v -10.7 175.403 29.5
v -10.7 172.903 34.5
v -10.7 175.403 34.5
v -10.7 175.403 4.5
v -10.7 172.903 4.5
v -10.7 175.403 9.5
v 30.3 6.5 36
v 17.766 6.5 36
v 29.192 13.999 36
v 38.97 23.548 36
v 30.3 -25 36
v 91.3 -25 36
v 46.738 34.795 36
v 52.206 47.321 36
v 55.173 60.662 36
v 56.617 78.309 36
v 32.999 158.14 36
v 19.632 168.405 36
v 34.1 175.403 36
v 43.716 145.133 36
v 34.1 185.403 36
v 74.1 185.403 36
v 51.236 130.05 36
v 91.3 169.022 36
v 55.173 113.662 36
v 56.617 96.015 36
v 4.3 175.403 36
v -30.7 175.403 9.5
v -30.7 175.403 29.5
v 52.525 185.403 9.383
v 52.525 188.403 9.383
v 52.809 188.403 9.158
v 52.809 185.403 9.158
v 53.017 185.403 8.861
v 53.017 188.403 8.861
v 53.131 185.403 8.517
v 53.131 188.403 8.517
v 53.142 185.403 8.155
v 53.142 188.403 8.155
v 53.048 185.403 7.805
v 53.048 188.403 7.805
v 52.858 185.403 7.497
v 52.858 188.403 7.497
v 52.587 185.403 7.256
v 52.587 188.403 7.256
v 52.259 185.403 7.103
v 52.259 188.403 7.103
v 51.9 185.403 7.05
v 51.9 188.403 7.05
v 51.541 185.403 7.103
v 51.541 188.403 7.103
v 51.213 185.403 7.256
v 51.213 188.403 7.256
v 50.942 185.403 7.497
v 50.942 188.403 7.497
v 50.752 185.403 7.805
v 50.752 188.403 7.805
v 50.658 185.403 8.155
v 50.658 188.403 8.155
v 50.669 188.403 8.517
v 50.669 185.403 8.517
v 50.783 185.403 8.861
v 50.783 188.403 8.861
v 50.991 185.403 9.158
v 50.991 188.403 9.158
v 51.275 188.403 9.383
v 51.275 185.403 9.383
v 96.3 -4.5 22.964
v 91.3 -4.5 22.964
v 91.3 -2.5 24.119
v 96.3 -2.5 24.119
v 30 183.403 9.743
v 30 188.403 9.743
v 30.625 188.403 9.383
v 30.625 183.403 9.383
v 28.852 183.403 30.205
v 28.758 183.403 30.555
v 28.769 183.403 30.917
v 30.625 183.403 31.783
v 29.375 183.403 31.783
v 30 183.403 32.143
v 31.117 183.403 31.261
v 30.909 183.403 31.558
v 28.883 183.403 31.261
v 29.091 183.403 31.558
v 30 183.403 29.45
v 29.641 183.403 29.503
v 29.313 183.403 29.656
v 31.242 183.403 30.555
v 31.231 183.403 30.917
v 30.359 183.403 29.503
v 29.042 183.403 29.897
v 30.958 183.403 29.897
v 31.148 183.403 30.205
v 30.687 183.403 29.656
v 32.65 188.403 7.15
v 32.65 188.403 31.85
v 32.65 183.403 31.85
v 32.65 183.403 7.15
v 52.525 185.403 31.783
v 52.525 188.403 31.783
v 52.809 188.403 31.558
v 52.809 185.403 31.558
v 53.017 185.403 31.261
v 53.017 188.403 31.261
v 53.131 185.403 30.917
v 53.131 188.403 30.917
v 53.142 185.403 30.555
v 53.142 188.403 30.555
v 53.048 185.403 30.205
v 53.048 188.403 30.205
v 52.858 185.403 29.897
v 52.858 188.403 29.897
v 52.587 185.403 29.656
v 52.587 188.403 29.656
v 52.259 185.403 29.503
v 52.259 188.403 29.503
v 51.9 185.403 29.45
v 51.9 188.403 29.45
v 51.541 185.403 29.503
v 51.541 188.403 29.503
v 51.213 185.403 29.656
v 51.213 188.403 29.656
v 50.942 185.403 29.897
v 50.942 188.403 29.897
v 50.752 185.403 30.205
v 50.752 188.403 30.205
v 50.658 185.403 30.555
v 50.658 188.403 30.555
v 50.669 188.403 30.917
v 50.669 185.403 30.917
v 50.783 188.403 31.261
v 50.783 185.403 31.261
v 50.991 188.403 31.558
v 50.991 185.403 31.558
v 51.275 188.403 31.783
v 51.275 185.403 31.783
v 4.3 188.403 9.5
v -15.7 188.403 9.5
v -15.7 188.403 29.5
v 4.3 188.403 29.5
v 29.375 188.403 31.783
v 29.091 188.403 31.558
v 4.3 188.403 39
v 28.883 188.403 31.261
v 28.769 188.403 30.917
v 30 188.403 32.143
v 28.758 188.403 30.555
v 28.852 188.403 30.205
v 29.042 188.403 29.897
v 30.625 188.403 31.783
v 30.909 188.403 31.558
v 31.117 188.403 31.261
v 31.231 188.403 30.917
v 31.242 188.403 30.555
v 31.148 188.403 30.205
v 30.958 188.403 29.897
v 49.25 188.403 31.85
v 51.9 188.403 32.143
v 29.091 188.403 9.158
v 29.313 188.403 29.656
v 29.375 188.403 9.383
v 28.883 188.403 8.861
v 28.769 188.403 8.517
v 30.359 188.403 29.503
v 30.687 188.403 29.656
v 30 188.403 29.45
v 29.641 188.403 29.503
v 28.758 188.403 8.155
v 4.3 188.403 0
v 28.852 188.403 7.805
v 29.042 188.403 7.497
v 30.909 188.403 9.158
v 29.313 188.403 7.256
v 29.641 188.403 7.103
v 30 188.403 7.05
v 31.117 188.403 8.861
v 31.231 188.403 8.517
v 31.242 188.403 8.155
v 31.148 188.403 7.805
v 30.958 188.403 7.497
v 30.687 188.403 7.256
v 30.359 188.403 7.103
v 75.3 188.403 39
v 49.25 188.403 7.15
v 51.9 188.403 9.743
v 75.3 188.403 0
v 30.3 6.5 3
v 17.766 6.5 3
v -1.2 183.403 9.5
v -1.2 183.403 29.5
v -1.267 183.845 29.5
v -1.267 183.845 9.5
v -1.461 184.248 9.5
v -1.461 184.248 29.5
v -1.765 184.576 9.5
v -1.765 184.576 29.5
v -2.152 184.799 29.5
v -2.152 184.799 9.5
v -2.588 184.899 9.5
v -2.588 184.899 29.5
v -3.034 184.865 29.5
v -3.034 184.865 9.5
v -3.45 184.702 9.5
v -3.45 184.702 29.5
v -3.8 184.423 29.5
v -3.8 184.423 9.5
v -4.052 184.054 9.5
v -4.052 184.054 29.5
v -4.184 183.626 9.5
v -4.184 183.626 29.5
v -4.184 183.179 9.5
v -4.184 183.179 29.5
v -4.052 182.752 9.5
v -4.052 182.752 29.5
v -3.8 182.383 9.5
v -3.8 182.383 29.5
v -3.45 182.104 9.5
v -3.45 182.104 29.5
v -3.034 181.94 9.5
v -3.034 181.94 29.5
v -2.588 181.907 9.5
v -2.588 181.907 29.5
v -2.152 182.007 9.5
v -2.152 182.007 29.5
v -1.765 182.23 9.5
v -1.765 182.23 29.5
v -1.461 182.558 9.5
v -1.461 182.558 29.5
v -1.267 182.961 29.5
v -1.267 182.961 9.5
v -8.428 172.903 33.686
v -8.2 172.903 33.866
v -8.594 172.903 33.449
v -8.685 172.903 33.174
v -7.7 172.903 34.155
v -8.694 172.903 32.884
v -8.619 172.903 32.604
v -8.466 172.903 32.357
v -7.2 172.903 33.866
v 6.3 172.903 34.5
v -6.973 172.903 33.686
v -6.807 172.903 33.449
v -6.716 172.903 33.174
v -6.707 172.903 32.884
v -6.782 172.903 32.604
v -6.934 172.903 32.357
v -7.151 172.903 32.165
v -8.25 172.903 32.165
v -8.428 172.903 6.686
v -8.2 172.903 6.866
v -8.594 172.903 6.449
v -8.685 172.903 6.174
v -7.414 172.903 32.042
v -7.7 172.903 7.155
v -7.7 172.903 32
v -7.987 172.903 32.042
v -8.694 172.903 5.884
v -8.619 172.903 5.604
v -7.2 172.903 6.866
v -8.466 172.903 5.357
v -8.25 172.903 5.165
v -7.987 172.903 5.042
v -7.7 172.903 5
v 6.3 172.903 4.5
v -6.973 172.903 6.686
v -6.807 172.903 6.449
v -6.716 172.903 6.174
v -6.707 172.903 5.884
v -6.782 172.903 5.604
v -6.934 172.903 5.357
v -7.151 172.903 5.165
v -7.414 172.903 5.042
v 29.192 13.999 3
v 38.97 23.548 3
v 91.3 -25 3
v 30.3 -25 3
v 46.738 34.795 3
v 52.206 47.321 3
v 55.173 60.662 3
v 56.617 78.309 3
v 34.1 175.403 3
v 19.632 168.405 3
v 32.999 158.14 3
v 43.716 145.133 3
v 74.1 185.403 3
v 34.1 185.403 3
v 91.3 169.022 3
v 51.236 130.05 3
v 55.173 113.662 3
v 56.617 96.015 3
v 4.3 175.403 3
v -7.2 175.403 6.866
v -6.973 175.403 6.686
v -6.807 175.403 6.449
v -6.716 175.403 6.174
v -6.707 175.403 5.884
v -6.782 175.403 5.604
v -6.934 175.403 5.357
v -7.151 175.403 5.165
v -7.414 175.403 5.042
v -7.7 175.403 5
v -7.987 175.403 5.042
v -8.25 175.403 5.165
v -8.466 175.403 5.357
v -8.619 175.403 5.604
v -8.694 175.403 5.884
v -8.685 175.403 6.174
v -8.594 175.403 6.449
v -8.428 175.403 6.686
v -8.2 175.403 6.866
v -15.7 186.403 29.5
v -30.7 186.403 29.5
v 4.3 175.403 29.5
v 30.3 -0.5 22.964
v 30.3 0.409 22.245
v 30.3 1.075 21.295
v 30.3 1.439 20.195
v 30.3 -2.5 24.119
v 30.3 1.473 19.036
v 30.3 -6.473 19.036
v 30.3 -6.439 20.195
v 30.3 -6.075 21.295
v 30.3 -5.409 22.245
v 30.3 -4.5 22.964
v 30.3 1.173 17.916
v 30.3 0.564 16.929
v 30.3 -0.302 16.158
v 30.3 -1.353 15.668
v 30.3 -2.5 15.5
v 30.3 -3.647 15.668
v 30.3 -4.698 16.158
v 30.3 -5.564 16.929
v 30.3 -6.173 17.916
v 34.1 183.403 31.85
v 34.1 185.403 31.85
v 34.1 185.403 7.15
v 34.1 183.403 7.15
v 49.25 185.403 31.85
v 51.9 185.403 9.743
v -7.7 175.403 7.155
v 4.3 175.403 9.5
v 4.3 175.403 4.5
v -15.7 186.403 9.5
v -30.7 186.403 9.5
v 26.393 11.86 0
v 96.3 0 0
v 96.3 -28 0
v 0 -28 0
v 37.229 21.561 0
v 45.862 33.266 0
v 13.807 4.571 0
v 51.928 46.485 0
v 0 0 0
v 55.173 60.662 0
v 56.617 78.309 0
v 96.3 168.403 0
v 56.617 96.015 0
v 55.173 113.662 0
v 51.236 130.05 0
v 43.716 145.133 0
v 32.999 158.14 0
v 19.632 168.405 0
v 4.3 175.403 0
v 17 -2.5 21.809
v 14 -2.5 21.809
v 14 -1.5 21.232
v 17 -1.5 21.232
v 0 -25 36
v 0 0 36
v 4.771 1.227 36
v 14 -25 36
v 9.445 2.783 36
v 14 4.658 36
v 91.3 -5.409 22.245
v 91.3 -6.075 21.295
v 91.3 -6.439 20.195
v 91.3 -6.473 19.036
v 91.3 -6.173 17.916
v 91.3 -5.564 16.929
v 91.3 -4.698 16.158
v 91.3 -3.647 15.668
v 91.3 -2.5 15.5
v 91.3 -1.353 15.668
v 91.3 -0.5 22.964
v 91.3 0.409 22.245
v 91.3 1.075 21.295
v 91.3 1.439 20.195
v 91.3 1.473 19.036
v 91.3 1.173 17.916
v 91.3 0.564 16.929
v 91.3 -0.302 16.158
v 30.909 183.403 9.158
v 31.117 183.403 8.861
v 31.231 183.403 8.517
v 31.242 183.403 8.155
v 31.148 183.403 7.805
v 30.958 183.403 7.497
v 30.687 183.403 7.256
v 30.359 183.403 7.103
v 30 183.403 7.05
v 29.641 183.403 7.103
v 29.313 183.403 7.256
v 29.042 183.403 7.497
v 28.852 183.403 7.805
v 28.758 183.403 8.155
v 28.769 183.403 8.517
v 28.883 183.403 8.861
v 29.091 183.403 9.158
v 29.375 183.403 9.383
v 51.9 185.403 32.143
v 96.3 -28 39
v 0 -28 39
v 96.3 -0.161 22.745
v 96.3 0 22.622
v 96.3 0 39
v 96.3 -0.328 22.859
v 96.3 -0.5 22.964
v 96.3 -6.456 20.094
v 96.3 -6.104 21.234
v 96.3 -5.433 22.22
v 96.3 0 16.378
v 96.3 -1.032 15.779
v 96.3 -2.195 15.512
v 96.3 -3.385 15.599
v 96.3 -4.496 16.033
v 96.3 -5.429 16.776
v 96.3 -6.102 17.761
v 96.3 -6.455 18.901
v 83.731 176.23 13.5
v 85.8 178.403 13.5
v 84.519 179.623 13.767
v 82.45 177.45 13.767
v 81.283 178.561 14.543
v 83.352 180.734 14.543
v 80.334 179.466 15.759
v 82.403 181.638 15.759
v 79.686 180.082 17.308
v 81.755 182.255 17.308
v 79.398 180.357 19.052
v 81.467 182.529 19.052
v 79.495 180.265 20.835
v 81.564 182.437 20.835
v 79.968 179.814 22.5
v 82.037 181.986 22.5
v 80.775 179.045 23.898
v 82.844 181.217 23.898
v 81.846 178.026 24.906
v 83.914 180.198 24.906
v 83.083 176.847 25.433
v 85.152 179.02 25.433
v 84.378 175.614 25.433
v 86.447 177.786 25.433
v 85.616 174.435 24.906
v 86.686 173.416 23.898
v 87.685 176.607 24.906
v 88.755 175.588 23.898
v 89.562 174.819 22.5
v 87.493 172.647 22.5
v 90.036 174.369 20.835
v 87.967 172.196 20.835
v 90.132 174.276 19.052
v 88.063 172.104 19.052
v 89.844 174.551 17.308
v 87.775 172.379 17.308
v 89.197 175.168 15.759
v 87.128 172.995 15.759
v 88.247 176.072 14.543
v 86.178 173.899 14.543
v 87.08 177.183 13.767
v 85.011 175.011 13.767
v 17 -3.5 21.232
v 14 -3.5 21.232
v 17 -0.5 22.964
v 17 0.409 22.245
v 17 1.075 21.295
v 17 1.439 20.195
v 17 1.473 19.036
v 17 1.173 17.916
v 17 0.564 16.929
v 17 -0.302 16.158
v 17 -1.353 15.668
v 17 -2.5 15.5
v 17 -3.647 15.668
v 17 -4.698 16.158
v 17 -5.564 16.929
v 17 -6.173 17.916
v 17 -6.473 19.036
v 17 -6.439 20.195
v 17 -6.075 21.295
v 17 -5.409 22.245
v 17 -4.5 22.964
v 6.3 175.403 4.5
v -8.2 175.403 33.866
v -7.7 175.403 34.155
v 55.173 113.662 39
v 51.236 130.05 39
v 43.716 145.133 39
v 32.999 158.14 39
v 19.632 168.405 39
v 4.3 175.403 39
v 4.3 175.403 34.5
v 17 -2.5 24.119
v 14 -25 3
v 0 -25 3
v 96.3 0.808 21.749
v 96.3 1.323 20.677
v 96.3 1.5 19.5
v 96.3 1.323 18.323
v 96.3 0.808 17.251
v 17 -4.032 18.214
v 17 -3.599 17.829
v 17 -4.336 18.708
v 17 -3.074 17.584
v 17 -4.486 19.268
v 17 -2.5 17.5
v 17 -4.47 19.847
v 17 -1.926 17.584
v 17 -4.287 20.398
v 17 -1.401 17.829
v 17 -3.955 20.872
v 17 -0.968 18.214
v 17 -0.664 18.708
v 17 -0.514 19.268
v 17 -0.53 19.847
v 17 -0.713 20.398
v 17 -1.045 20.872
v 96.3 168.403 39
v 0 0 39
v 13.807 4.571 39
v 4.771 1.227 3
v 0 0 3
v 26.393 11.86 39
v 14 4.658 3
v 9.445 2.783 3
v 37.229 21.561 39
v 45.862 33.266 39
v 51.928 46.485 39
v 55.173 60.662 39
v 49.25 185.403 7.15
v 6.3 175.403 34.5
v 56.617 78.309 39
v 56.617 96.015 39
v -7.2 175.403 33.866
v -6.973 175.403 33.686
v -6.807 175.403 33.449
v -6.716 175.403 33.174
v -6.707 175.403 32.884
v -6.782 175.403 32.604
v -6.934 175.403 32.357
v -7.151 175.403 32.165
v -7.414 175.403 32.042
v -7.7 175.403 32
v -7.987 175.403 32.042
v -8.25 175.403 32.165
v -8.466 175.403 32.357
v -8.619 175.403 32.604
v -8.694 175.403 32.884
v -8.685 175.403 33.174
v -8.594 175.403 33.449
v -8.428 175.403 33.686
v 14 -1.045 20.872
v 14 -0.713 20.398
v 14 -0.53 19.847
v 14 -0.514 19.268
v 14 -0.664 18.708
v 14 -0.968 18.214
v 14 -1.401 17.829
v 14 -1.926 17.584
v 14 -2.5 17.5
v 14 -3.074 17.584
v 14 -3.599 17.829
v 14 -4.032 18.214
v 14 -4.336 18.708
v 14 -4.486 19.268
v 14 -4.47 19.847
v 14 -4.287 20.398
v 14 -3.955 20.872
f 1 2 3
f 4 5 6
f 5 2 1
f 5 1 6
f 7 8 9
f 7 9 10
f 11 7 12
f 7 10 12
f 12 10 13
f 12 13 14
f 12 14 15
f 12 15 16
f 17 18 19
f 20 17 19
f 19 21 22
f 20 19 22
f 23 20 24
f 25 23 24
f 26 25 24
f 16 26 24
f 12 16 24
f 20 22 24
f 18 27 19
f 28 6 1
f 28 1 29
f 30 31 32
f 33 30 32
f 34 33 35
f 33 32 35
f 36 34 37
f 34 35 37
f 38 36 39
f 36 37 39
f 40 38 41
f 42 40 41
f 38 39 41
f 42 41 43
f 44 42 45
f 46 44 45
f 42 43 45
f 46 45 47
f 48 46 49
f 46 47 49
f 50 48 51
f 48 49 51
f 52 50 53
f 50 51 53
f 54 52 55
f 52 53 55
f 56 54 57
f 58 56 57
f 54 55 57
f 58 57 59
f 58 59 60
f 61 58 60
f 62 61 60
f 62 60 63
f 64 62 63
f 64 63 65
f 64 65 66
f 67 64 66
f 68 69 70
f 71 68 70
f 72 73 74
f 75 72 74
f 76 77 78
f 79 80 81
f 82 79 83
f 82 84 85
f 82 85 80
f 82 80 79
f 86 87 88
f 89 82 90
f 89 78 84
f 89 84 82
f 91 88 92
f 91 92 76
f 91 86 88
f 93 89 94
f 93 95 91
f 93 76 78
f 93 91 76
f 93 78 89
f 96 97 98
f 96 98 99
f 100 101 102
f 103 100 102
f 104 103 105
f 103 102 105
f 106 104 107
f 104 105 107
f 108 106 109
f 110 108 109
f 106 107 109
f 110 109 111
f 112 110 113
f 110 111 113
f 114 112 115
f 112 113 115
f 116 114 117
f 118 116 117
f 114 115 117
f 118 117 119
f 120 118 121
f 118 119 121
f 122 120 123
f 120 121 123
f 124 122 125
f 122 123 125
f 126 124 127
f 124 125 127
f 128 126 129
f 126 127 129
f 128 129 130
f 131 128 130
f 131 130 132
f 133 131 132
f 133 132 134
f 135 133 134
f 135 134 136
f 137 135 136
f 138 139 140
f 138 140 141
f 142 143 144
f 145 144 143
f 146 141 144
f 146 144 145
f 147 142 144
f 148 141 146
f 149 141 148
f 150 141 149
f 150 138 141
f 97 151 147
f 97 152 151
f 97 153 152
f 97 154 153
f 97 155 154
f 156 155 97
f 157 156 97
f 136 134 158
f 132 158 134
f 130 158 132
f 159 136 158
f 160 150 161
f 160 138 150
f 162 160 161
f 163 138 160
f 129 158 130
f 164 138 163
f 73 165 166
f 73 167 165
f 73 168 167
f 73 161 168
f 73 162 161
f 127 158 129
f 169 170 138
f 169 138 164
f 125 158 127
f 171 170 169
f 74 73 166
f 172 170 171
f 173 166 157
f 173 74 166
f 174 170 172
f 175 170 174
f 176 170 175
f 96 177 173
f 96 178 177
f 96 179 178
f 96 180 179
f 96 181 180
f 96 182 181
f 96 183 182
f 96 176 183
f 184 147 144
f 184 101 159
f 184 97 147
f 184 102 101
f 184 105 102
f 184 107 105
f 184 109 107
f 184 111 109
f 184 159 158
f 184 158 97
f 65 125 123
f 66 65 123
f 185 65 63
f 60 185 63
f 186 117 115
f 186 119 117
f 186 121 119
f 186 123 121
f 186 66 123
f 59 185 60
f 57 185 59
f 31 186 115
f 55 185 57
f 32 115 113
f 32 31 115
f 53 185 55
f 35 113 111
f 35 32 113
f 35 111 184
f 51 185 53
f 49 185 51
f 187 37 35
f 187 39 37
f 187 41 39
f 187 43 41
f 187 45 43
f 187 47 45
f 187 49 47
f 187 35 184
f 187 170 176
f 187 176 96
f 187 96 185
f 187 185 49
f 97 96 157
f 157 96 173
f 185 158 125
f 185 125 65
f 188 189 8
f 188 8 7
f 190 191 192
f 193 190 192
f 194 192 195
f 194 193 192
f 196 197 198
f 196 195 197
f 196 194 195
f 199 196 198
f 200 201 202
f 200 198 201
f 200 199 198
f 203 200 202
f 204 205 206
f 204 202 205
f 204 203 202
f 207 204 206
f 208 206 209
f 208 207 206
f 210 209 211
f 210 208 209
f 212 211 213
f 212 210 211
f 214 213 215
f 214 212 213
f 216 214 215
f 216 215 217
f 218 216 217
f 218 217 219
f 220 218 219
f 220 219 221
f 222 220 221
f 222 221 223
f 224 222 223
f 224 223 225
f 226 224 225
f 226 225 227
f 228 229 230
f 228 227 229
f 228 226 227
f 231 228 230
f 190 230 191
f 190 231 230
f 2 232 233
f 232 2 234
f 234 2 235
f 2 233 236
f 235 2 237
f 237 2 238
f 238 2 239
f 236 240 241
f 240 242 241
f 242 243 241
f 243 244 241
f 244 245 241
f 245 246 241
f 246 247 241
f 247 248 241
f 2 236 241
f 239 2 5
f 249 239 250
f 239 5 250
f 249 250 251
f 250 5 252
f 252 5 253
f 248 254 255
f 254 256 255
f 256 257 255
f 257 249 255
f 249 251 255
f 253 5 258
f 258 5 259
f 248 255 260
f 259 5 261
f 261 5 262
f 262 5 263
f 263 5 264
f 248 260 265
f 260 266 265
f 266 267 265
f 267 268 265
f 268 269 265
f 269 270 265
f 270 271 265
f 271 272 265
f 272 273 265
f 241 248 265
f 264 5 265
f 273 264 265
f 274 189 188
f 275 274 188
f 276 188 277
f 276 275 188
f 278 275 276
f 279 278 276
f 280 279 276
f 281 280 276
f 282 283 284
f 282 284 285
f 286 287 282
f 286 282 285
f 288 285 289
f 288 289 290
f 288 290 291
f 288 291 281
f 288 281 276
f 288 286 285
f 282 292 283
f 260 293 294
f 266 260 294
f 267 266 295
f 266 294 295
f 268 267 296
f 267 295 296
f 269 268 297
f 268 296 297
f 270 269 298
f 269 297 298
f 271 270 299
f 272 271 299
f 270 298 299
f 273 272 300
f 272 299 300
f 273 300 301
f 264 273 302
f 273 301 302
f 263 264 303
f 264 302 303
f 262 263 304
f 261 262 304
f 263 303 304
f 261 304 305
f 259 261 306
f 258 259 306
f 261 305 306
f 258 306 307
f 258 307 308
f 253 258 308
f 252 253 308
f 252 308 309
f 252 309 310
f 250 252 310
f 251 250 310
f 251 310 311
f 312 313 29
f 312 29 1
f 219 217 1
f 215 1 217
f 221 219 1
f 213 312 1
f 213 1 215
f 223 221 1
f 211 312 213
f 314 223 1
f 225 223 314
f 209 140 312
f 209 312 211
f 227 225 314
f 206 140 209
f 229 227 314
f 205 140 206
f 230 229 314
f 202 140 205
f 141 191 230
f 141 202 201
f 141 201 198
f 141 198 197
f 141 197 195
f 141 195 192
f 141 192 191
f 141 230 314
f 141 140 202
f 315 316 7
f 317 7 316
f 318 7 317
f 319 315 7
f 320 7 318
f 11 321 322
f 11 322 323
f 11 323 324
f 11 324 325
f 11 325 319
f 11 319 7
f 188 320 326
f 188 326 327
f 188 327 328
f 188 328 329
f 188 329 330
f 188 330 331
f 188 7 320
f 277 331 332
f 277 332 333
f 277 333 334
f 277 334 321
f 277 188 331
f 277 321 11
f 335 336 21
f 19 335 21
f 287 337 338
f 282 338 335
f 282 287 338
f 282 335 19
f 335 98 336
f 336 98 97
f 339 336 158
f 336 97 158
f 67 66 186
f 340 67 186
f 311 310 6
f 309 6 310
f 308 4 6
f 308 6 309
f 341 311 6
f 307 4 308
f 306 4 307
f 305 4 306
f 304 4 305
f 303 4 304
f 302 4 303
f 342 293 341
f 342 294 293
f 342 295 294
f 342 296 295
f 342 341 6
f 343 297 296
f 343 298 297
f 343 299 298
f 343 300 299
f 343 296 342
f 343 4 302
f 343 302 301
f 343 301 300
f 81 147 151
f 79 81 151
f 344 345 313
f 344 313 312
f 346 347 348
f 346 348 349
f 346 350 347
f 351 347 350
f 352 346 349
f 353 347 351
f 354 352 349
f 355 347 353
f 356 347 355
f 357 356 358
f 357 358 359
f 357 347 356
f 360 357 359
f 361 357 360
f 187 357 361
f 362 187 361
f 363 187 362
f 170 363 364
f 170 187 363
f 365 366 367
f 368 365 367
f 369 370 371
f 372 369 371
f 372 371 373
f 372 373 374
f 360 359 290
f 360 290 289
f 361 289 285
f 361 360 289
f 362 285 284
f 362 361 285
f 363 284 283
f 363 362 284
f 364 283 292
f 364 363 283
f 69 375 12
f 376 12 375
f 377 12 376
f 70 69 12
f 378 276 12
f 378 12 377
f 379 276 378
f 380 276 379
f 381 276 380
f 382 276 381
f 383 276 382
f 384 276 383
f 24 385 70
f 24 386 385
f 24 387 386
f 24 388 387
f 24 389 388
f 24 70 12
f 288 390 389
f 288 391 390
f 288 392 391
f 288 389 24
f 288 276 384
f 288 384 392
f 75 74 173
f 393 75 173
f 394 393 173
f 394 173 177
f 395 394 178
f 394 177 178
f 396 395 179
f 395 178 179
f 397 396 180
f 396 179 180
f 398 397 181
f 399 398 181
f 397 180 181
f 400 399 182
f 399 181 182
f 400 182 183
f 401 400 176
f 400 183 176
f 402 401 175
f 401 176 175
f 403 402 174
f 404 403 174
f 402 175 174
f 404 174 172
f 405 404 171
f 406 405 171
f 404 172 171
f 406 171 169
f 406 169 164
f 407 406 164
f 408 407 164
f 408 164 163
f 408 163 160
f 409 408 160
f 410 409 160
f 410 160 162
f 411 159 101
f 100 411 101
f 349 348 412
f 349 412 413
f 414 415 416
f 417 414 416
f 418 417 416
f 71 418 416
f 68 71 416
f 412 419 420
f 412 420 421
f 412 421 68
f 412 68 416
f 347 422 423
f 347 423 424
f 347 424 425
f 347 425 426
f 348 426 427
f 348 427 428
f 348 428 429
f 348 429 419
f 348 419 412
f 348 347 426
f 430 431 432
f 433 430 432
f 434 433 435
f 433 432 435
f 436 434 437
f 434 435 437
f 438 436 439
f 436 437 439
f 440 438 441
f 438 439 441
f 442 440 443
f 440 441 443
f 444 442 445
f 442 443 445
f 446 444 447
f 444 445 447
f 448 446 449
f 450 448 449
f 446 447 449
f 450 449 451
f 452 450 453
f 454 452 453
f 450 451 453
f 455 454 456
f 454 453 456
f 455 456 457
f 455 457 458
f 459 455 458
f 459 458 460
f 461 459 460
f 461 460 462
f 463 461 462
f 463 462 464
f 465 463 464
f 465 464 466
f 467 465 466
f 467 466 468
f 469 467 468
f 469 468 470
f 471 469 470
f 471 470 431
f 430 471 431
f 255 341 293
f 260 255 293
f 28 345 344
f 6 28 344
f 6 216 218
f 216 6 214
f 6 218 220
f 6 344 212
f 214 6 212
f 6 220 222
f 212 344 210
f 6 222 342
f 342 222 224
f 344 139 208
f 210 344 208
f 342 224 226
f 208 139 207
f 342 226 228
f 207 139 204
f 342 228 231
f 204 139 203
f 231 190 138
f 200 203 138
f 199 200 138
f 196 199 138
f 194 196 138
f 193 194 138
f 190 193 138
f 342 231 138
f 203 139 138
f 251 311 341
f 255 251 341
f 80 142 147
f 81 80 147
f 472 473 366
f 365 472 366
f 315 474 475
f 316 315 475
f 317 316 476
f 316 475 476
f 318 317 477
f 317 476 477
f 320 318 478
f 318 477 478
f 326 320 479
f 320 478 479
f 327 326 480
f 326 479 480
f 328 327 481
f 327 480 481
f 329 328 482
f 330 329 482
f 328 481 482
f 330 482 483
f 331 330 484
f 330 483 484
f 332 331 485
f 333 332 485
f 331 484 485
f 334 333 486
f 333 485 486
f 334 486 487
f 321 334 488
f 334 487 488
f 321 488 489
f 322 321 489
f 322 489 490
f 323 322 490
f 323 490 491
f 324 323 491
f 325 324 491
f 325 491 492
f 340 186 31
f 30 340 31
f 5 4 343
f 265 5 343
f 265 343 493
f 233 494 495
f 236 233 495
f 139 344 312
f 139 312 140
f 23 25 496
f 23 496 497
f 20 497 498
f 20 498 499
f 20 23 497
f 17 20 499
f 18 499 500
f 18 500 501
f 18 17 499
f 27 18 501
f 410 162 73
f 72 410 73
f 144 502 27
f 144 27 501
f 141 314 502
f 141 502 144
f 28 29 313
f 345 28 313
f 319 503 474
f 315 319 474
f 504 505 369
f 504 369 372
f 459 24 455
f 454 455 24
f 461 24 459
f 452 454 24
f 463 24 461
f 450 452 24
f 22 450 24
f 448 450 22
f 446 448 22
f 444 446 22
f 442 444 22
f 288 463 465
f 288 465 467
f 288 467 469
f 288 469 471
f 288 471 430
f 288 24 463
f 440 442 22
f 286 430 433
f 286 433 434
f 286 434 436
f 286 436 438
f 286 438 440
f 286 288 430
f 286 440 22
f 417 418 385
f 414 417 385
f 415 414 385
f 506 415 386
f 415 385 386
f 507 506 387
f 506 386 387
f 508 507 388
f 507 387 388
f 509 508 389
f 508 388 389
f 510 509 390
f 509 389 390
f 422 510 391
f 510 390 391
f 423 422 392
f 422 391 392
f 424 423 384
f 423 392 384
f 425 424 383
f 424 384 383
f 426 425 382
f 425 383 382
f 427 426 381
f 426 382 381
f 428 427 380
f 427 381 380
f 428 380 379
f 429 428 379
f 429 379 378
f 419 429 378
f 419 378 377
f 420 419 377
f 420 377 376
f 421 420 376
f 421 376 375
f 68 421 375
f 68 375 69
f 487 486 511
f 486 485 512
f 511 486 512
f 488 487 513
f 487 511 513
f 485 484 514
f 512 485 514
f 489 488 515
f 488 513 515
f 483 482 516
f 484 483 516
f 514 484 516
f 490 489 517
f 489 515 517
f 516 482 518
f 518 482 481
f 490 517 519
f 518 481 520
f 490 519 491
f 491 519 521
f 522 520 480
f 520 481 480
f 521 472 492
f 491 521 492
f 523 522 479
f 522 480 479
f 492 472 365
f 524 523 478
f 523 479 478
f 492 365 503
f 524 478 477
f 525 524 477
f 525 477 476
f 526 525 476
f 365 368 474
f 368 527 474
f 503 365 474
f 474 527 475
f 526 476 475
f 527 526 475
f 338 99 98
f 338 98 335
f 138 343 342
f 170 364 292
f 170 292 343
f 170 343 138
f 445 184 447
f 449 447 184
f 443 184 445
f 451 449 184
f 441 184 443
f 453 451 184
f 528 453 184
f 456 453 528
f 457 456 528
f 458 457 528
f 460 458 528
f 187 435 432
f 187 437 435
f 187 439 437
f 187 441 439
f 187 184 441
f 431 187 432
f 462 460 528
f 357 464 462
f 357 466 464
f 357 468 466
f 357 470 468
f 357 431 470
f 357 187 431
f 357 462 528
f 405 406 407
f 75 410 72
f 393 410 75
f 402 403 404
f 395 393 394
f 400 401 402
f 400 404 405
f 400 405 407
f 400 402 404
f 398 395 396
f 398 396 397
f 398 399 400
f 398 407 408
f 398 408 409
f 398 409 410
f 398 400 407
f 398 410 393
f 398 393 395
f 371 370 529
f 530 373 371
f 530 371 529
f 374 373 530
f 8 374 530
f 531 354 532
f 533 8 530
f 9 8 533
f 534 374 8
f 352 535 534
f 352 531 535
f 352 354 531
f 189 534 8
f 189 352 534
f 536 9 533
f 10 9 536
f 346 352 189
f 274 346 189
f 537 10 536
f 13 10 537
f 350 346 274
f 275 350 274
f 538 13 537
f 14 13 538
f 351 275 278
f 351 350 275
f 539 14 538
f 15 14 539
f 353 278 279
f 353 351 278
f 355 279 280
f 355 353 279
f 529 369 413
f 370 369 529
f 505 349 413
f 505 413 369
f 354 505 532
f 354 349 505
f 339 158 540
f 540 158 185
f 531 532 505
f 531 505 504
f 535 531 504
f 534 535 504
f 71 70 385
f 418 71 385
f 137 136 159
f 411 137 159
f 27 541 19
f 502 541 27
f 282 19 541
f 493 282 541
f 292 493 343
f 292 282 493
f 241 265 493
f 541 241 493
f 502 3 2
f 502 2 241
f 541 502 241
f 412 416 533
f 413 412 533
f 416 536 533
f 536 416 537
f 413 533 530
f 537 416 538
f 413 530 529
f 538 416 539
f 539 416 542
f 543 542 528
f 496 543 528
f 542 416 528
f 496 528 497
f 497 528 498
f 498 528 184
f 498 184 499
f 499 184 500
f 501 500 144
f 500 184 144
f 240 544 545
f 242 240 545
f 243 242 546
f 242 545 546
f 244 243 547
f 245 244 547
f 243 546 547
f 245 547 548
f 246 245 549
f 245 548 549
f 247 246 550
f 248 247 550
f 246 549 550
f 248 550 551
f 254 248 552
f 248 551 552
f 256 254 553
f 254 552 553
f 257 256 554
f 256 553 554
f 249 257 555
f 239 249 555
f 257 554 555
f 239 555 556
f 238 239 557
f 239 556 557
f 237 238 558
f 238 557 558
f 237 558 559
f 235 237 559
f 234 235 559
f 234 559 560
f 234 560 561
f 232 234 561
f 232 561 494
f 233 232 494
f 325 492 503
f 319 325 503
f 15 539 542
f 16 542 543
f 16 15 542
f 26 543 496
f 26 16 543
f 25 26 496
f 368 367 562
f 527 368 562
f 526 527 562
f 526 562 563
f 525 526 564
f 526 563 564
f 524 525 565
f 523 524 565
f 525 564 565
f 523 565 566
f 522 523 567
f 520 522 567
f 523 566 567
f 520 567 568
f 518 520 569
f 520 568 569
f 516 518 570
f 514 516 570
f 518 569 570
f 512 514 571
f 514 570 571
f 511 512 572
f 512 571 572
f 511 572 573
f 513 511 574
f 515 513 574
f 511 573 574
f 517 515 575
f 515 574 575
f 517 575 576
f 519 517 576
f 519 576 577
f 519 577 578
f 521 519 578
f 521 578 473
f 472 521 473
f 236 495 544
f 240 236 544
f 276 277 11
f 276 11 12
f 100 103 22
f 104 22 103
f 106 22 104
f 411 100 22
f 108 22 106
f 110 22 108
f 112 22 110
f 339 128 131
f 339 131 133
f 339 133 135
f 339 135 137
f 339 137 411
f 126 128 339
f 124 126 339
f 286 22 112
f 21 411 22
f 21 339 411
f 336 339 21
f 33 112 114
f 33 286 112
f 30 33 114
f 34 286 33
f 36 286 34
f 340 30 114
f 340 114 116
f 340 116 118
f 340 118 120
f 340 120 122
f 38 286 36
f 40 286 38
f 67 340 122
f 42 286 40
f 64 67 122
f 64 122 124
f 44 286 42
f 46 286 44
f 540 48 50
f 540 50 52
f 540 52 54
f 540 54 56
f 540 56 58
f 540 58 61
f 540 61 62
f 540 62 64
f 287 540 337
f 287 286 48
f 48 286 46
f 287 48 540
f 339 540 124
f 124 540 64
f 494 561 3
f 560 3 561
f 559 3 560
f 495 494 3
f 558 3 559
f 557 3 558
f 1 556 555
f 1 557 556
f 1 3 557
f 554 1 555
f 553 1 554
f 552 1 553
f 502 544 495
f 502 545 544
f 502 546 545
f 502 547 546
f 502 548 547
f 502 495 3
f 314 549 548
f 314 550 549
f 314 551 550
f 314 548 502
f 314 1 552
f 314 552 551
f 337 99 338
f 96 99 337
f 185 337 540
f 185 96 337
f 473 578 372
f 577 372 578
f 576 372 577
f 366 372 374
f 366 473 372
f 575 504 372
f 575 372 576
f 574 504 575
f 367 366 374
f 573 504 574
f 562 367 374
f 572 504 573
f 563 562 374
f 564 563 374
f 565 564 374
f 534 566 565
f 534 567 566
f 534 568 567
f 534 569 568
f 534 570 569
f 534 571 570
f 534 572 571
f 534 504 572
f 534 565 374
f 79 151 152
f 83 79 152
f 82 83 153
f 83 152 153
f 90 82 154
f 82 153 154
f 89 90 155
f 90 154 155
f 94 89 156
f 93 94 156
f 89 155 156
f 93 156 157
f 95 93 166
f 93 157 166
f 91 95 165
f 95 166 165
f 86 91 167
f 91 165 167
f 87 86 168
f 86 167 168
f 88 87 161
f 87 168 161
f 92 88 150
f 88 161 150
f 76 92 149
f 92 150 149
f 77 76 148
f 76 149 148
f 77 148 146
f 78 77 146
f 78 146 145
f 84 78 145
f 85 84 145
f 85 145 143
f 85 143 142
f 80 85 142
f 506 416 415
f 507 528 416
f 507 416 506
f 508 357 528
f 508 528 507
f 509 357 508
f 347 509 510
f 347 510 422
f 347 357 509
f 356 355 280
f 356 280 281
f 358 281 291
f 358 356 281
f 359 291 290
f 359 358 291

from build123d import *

# Parameters (mm, degrees)
EXTRUDE_6_DEPTH      = 39
CUT_EXTRUDE_START    = 3
CUT_EXTRUDE_2_DEPTH  = 33
EXTRUDE_START        = 9.5
SKETCH_7_W           = 35
SKETCH_7_H           = 13
EXTRUDE_7_DEPTH      = 20
EXTRUDE_START_2      = 4.5
SKETCH_11_W          = 17
SKETCH_11_H          = 2.5
EXTRUDE_15_DEPTH     = 30
CUT_EXTRUDE_START_2  = 180
CUT_EXTRUDE_3_DEPTH  = 10
SKETCH_13_R          = 1.5
CUT_EXTRUDE_4_DEPTH  = 30
SKETCH_14_W          = 15
SKETCH_14_H          = 2
CUT_EXTRUDE_5_DEPTH  = 30
CUT_EXTRUDE_START_3  = 17
CUT_EXTRUDE_7_DEPTH  = 85
CUT_EXTRUDE_START_4  = 13
CUT_EXTRUDE_9_DEPTH  = 5
SKETCH_20_W          = 16.6
SKETCH_20_H          = 24.7
CUT_EXTRUDE_10_DEPTH = 5
SKETCH_21_R          = 6
CUT_EXTRUDE_11_DEPTH = 5


with BuildPart() as part:
    # Эскиз1 → Бобышка-Вытянуть6 (new body)
    with BuildSketch(Plane.XY):
        with BuildLine():
            Line((4.299618531, 175.402841826), (4.299618531, 188.402841826))
            Line((4.299618531, 188.402841826), (75.299618531, 188.402841826))
            Line((75.299618531, 188.402841826), (96.299618531, 168.402841826))
            Line((96.299618531, 168.402841826), (96.299619, 0))
            Line((96.299619, 0), (96.299619, -28))
            Line((96.299619, -28), (0, -28))
            Line((0, -28), (0, 0))
            ThreePointArc((0, 0), (37.229295141, 21.561020186), (55.173142182, 60.662380285))
            ThreePointArc((55.173142182, 60.662380285), (56.797307883, 87.162380285), (55.173142182, 113.662380285))
            ThreePointArc((55.173142182, 113.662380285), (38.726552267, 151.940422917), (4.299618531, 175.402841826))
        make_face()
    extrude(amount=EXTRUDE_6_DEPTH)

    # Эскиз5 → Вырез-Вытянуть2 (cut)
    with BuildSketch(Plane.XY.offset(CUT_EXTRUDE_START)):
        Polygon((34.099618531, 175.402841826), (4.299618531, 175.402841826), (4.299618531, 169.021888999), (-18.700381469, 169.021888999), (-18.700381469, -25), (14, -25), (14, 6.5), (30.299619, 6.5), (30.299619, -25), (91.299619, -25), (91.299619, 169.021888999), (74.099618531, 185.402841826), (34.099618531, 185.402841826), align=None)
    extrude(amount=CUT_EXTRUDE_2_DEPTH, mode=Mode.SUBTRACT)

    # Эскиз7 → Бобышка-Вытянуть7 (add)
    with BuildSketch(Plane.XY.offset(EXTRUDE_START)):
        with Locations((-13.200381469, 181.902841826)):
            Rectangle(SKETCH_7_W, SKETCH_7_H)
    extrude(amount=EXTRUDE_7_DEPTH)

    # Эскиз11 → Бобышка-Вытянуть15 (add)
    with BuildSketch(Plane.XY.offset(EXTRUDE_START_2)):
        with Locations((-2.200381469, 174.152841826)):
            Rectangle(SKETCH_11_W, SKETCH_11_H)
    extrude(amount=EXTRUDE_15_DEPTH)

    # Эскиз12 → Вырез-Вытянуть3 (cut)
    with BuildSketch(Plane(origin=(0, 0, 0), x_dir=(1, 0, 0), z_dir=(0, 1, 0)).offset(CUT_EXTRUDE_START_2)):
        with BuildLine():
            Line((-7.700381469, -34.154700538), (-7.200381469, -33.866025404))
            ThreePointArc((-7.200381469, -33.866025404), (-7.700381469, -32), (-8.200381469, -33.866025404))
            Line((-8.200381469, -33.866025404), (-7.700381469, -34.154700538))
        make_face()
        with BuildLine():
            Line((-7.700381469, -7.154700538), (-7.200381469, -6.866025404))
            ThreePointArc((-7.200381469, -6.866025404), (-7.700381469, -5), (-8.200381469, -6.866025404))
            Line((-8.200381469, -6.866025404), (-7.700381469, -7.154700538))
        make_face()
    extrude(amount=-CUT_EXTRUDE_3_DEPTH, mode=Mode.SUBTRACT)

    # Эскиз13 → Вырез-Вытянуть4 (cut)
    with BuildSketch(Plane.XY):
        with Locations((-2.700381469, 183.402841826)):
            Circle(SKETCH_13_R)
    extrude(amount=CUT_EXTRUDE_4_DEPTH, mode=Mode.SUBTRACT)

    # Эскиз14 → Вырез-Вытянуть5 (cut)
    with BuildSketch(Plane.XY):
        with Locations((-23.200381469, 187.402841826)):
            Rectangle(SKETCH_14_W, SKETCH_14_H)
    extrude(amount=CUT_EXTRUDE_5_DEPTH, mode=Mode.SUBTRACT)

    # Эскиз17 → Вырез-Вытянуть7 (cut)
    with BuildSketch(Plane(origin=(0, 0, 0), x_dir=(0, 0, -1), z_dir=(1, 0, 0)).offset(CUT_EXTRUDE_START_3)):
        with BuildLine():
            Line((-24.118802154, -2.5), (-22.964101615, -0.5))
            ThreePointArc((-22.964101615, -0.5), (-15.5, -2.5), (-22.964101615, -4.5))
            Line((-22.964101615, -4.5), (-24.118802154, -2.5))
        make_face()
    extrude(amount=CUT_EXTRUDE_7_DEPTH, mode=Mode.SUBTRACT)

    # Эскиз18 → Вырез-Вытянуть9 (cut)
    with BuildSketch(Plane(origin=(0, 0, 0), x_dir=(0, 0, -1), z_dir=(1, 0, 0)).offset(CUT_EXTRUDE_START_4)):
        with BuildLine():
            Line((-21.809401077, -2.5), (-21.232050808, -1.5))
            ThreePointArc((-21.232050808, -1.5), (-17.5, -2.5), (-21.232050808, -3.5))
            Line((-21.232050808, -3.5), (-21.809401077, -2.5))
        make_face()
    extrude(amount=CUT_EXTRUDE_9_DEPTH, mode=Mode.SUBTRACT)

    # Эскиз20 → Вырез-Вытянуть10 (cut)
    with BuildSketch(Plane(origin=(0, 188.402841826, 0), x_dir=(1, 0, 0), z_dir=(0, 1, 0))):
        with Locations((40.95, -19.5)):
            Rectangle(SKETCH_20_W, SKETCH_20_H)
        with BuildLine():
            Line((30, -32.143375673), (30.625, -31.782531755))
            ThreePointArc((30.625, -31.782531755), (30, -29.45), (29.375, -31.782531755))
            Line((29.375, -31.782531755), (30, -32.143375673))
        make_face()
        with BuildLine():
            Line((30, -9.743375673), (30.625, -9.382531755))
            ThreePointArc((30.625, -9.382531755), (30, -7.05), (29.375, -9.382531755))
            Line((29.375, -9.382531755), (30, -9.743375673))
        make_face()
        with BuildLine():
            Line((51.9, -9.743375673), (52.525, -9.382531755))
            ThreePointArc((52.525, -9.382531755), (51.9, -7.05), (51.275, -9.382531755))
            Line((51.275, -9.382531755), (51.9, -9.743375673))
        make_face()
        with BuildLine():
            Line((51.9, -32.143375673), (52.525, -31.782531755))
            ThreePointArc((52.525, -31.782531755), (51.9, -29.45), (51.275, -31.782531755))
            Line((51.275, -31.782531755), (51.9, -32.143375673))
        make_face()
    extrude(amount=-CUT_EXTRUDE_10_DEPTH, mode=Mode.SUBTRACT)

    # Эскиз21 → Вырез-Вытянуть11 (cut)
    with BuildSketch(Plane(origin=(129.903734815, 136.398921556, 0), x_dir=(0, 0, -1), z_dir=(0.689655172, 0.724137931, 0))):
        with Locations((-19.5, 60.905684392)):
            Circle(SKETCH_21_R)
    extrude(amount=-CUT_EXTRUDE_11_DEPTH, mode=Mode.SUBTRACT)


solid = part.part
